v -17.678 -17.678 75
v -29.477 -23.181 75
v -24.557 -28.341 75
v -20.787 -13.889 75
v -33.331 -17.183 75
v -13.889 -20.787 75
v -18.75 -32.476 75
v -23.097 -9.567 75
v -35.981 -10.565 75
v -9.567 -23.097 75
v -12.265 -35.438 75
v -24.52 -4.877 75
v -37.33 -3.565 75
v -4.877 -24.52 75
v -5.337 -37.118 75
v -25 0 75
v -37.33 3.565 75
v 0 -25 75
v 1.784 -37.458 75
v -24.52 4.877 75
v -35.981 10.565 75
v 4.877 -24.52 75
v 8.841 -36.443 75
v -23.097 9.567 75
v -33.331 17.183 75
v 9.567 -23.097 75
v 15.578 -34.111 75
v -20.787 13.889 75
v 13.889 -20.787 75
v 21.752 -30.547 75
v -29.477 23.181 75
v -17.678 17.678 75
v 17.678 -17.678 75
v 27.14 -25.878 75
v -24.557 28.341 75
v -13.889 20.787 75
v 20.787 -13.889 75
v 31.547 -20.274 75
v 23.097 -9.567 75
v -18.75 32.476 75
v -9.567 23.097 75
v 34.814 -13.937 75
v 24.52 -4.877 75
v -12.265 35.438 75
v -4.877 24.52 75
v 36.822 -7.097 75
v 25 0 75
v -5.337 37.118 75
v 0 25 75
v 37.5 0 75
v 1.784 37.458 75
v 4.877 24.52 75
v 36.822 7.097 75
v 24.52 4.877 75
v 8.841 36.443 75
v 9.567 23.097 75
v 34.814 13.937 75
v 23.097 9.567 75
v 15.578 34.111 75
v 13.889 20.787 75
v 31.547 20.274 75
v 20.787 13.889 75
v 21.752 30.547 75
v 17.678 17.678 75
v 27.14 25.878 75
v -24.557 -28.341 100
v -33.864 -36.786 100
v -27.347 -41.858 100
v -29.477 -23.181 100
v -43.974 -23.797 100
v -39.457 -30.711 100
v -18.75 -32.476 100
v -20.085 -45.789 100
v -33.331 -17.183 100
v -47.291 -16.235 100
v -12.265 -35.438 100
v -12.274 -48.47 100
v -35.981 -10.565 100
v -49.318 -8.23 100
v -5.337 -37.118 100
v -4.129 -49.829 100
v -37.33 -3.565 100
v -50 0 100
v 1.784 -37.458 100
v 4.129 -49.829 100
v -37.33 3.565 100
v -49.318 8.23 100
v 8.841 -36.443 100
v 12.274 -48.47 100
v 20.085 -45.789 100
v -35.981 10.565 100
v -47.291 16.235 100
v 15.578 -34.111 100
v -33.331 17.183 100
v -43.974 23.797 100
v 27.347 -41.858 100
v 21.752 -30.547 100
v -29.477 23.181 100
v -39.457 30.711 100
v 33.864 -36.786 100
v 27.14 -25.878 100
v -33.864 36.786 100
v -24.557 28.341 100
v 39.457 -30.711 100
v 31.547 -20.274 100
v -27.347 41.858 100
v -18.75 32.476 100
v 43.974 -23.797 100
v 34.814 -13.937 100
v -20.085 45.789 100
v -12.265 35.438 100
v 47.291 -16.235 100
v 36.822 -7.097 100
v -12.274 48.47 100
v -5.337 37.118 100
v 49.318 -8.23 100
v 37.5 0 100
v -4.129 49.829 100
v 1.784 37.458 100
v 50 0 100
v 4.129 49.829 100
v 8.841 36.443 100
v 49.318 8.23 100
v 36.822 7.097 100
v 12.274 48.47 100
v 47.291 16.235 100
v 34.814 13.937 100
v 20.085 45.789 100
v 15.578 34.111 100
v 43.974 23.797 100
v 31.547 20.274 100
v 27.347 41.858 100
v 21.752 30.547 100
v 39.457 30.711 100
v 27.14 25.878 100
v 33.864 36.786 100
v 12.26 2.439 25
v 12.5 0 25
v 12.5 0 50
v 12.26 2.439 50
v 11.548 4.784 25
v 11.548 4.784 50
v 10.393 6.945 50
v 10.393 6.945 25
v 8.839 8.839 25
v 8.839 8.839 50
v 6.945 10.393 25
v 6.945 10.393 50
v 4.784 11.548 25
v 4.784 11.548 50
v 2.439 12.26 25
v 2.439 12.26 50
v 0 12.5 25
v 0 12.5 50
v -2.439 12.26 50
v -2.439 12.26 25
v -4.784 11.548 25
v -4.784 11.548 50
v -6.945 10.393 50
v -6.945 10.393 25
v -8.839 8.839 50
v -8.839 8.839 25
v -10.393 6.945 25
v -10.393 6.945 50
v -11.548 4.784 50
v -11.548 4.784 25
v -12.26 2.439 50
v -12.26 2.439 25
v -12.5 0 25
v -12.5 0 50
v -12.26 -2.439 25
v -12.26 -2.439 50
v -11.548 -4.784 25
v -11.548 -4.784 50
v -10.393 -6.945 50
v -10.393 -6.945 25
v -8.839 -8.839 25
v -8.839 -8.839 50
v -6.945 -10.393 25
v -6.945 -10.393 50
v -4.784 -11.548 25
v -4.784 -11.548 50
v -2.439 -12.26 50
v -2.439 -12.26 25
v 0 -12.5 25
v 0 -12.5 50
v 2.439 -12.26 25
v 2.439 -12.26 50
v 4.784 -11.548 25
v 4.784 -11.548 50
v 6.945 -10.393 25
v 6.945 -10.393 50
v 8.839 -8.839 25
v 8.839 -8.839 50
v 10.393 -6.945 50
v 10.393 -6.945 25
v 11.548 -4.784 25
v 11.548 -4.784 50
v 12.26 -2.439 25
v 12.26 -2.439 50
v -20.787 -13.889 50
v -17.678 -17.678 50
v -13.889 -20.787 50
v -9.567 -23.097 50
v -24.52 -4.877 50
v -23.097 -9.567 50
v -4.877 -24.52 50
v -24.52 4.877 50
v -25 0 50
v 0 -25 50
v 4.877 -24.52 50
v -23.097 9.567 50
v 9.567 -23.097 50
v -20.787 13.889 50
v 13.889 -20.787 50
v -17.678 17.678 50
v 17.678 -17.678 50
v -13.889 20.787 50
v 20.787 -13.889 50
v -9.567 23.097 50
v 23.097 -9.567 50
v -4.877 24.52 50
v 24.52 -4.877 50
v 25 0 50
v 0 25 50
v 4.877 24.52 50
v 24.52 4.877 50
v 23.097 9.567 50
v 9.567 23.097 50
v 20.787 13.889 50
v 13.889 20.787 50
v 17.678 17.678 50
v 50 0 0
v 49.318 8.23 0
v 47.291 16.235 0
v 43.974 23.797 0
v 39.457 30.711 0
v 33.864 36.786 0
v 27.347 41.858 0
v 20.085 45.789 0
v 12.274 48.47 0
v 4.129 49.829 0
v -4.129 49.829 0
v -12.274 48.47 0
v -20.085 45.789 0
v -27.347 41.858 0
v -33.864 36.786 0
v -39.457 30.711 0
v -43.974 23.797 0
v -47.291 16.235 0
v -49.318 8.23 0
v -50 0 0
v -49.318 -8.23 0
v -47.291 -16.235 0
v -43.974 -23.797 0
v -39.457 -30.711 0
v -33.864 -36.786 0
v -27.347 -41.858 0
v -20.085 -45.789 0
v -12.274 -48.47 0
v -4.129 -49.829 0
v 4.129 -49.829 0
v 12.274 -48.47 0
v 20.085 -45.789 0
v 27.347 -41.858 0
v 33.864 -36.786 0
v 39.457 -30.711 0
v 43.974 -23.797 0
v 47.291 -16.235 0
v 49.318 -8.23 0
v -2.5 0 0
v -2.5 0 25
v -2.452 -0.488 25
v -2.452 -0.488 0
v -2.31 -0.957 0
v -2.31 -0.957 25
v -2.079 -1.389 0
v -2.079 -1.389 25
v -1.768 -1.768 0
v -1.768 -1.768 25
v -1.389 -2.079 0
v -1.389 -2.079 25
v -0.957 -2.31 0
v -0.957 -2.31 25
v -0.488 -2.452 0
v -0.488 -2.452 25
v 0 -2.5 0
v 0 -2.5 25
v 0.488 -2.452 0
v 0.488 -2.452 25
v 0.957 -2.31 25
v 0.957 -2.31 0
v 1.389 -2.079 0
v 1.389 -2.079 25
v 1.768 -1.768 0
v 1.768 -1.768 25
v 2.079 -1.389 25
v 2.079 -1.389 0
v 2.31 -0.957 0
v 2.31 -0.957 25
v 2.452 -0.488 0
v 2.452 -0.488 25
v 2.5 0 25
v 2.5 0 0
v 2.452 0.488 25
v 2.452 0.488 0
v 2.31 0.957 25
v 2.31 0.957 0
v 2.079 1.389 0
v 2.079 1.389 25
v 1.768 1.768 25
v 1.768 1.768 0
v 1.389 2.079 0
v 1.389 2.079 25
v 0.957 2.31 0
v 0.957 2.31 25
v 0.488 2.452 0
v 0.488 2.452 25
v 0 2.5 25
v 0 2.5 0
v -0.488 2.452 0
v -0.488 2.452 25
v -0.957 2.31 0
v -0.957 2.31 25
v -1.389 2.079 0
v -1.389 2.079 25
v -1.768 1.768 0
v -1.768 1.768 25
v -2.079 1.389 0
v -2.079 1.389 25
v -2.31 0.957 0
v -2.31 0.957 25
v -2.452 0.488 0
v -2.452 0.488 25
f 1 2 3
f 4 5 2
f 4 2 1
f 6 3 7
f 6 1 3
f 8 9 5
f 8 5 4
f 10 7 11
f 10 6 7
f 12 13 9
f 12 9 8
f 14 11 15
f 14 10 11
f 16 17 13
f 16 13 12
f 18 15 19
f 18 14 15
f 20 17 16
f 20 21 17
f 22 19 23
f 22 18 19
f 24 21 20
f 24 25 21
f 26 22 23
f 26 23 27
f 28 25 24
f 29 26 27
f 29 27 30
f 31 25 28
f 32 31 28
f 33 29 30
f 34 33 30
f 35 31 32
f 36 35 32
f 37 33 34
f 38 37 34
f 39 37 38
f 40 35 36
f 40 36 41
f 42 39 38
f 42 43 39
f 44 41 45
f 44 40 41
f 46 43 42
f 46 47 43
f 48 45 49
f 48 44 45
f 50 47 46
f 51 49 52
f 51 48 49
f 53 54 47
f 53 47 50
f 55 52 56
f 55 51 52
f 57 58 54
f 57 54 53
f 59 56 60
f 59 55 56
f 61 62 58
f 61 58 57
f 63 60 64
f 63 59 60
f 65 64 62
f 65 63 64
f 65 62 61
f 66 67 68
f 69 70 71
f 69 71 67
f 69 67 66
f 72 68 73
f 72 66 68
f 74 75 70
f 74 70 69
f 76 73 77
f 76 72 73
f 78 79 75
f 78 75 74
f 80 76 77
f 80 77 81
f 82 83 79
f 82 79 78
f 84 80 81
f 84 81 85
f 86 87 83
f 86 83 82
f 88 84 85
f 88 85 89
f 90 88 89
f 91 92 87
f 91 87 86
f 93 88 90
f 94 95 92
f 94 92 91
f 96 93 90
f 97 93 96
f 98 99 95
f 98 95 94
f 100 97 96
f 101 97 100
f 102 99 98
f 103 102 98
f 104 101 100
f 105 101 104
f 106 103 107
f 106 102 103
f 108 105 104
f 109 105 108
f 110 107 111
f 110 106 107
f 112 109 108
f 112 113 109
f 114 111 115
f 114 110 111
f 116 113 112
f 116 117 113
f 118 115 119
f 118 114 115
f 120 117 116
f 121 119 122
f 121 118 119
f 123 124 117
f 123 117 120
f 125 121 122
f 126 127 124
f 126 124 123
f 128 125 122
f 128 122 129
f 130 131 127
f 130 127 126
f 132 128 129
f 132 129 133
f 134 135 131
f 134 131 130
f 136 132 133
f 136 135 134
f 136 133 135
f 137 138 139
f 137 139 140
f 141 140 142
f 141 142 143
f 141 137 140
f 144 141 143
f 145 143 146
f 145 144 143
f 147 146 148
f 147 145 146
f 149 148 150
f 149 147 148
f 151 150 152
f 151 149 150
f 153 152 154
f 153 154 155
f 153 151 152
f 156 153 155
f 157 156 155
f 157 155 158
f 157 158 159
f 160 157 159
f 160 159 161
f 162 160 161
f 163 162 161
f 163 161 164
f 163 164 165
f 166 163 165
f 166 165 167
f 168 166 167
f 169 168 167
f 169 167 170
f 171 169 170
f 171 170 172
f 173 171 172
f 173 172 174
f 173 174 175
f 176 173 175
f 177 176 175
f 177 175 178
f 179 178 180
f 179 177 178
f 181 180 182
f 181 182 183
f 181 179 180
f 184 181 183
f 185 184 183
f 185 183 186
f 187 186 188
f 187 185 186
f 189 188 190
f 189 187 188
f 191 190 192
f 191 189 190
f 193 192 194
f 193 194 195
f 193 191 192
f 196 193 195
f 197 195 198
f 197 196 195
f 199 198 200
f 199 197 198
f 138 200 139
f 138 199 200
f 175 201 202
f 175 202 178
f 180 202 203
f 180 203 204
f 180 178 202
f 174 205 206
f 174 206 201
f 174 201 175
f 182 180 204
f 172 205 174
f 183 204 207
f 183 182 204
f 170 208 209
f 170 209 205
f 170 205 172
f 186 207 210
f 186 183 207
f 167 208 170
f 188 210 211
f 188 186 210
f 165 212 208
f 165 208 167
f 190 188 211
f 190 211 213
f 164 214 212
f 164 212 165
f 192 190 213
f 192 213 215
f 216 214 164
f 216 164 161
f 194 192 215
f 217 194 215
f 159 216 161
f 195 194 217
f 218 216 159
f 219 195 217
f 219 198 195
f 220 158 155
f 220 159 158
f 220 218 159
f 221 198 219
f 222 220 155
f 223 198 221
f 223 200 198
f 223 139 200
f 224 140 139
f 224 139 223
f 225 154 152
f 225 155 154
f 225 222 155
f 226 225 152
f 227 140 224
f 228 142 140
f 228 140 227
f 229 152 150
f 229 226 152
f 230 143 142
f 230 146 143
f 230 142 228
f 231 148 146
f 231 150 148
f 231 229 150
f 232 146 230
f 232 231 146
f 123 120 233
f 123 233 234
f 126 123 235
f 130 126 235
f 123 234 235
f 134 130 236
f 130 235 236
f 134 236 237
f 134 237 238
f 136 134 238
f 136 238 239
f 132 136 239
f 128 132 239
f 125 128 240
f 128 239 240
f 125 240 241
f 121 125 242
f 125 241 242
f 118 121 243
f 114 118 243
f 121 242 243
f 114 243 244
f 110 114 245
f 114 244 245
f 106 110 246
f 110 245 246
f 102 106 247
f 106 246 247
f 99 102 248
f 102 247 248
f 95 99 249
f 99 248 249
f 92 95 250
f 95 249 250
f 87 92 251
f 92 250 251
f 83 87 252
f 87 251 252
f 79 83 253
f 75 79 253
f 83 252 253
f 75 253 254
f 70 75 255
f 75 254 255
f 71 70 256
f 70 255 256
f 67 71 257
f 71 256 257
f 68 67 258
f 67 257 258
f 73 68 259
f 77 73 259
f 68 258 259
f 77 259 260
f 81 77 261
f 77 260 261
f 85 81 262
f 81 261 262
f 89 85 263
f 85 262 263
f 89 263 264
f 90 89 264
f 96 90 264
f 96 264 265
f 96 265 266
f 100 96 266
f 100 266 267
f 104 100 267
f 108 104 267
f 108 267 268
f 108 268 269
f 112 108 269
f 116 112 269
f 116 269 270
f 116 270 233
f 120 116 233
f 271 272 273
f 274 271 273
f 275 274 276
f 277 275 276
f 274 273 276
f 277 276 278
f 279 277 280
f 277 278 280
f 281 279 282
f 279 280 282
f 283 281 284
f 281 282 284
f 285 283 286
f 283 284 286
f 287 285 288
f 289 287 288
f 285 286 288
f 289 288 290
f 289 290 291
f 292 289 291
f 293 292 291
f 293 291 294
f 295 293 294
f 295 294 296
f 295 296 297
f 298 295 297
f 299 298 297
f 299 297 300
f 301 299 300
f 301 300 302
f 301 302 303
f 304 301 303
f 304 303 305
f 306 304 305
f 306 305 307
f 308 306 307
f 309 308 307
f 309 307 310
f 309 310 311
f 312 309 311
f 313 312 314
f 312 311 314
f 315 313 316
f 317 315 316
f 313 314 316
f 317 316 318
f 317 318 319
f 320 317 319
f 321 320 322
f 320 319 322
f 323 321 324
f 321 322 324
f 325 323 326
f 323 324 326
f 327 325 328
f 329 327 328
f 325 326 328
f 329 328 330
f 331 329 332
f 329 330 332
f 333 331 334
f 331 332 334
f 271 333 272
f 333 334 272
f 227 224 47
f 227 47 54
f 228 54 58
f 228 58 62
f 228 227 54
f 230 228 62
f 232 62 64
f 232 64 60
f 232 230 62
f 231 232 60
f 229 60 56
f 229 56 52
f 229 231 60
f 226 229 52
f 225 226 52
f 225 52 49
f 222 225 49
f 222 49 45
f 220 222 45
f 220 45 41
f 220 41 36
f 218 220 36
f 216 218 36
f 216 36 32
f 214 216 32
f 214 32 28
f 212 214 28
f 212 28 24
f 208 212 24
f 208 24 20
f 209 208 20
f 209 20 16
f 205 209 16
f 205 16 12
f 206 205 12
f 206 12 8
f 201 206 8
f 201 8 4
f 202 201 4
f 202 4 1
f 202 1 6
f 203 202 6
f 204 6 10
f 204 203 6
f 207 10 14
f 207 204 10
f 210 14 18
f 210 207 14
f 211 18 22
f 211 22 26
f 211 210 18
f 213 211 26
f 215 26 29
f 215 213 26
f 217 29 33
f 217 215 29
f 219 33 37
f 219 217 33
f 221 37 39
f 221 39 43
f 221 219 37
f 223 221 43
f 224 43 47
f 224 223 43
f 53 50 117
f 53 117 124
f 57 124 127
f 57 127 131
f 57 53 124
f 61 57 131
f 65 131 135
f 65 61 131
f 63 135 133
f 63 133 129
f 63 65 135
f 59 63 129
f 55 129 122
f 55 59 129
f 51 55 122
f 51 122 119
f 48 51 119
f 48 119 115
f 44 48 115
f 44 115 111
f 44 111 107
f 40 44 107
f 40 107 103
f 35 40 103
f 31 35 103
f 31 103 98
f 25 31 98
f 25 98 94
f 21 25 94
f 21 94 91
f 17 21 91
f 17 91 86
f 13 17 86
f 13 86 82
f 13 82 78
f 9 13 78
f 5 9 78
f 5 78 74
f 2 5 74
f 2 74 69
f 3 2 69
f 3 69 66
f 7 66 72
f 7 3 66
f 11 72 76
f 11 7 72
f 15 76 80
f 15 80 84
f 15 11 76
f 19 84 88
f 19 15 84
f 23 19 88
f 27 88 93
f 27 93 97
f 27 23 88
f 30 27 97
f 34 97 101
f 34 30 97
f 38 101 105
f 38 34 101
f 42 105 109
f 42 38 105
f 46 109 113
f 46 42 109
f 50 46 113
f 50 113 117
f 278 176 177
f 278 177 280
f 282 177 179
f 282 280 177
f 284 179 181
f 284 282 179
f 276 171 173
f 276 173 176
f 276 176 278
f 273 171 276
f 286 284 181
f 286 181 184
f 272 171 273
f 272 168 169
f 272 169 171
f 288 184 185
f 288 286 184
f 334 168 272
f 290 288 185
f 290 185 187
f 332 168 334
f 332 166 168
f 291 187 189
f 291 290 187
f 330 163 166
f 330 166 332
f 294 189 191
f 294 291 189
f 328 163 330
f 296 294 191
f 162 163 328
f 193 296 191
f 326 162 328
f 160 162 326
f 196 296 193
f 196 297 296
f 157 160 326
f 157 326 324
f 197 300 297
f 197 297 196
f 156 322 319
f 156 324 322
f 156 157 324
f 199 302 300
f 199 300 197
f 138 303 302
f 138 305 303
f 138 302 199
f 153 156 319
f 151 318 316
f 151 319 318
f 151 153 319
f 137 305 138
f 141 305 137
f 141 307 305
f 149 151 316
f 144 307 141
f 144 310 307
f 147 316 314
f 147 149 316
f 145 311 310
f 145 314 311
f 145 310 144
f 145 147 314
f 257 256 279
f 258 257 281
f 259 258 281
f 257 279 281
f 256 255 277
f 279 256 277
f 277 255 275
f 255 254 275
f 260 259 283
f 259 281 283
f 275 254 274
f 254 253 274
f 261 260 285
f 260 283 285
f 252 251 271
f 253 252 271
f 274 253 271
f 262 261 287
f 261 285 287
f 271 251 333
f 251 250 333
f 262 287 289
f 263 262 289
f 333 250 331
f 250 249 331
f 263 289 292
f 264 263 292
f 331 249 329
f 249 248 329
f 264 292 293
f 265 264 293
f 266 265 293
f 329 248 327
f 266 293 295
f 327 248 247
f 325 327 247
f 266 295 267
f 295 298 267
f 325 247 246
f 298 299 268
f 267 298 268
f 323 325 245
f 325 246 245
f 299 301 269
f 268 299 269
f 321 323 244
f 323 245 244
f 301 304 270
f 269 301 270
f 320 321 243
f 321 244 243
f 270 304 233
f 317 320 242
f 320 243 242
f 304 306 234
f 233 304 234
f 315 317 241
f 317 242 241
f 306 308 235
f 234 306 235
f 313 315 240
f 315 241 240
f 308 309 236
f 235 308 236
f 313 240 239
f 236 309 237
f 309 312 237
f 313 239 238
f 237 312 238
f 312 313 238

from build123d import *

# Parameters (mm, degrees)
F0_R     = 12.5
F1_DEPTH = 25
F0_R_2   = 25
F2_DEPTH = 50
F0_R_3   = 37.5
F3_DEPTH = 75
F0_R_4   = 50
F4_DEPTH = 100
F5_D     = 5


with BuildPart() as f1:
    # F0 (on Top) → F1 (new body)
    with BuildSketch(Plane.XY):
        Circle(F0_R)
    extrude(amount=F1_DEPTH)

    # F0 (on Top) → F2 (join)
    with BuildSketch(Plane.XY):
        Circle(F0_R_2)
        Circle(F0_R, mode=Mode.SUBTRACT)
    extrude(amount=F2_DEPTH)

    # F0 (on Top) → F3 (join)
    with BuildSketch(Plane.XY):
        Circle(F0_R_3)
        Circle(F0_R_2, mode=Mode.SUBTRACT)
    extrude(amount=F3_DEPTH)

    # F0 (on Top) → F4 (join)
    with BuildSketch(Plane.XY):
        Circle(F0_R_4)
        Circle(F0_R_3, mode=Mode.SUBTRACT)
    extrude(amount=F4_DEPTH)

    # F5 (through all)
    with Locations(Plane(origin=(0, 0, 0), x_dir=(1, 0, 0), z_dir=(0, 0, -1))):
        with Locations((0, 0)):
            Hole(F5_D / 2)


solid = f1.part
